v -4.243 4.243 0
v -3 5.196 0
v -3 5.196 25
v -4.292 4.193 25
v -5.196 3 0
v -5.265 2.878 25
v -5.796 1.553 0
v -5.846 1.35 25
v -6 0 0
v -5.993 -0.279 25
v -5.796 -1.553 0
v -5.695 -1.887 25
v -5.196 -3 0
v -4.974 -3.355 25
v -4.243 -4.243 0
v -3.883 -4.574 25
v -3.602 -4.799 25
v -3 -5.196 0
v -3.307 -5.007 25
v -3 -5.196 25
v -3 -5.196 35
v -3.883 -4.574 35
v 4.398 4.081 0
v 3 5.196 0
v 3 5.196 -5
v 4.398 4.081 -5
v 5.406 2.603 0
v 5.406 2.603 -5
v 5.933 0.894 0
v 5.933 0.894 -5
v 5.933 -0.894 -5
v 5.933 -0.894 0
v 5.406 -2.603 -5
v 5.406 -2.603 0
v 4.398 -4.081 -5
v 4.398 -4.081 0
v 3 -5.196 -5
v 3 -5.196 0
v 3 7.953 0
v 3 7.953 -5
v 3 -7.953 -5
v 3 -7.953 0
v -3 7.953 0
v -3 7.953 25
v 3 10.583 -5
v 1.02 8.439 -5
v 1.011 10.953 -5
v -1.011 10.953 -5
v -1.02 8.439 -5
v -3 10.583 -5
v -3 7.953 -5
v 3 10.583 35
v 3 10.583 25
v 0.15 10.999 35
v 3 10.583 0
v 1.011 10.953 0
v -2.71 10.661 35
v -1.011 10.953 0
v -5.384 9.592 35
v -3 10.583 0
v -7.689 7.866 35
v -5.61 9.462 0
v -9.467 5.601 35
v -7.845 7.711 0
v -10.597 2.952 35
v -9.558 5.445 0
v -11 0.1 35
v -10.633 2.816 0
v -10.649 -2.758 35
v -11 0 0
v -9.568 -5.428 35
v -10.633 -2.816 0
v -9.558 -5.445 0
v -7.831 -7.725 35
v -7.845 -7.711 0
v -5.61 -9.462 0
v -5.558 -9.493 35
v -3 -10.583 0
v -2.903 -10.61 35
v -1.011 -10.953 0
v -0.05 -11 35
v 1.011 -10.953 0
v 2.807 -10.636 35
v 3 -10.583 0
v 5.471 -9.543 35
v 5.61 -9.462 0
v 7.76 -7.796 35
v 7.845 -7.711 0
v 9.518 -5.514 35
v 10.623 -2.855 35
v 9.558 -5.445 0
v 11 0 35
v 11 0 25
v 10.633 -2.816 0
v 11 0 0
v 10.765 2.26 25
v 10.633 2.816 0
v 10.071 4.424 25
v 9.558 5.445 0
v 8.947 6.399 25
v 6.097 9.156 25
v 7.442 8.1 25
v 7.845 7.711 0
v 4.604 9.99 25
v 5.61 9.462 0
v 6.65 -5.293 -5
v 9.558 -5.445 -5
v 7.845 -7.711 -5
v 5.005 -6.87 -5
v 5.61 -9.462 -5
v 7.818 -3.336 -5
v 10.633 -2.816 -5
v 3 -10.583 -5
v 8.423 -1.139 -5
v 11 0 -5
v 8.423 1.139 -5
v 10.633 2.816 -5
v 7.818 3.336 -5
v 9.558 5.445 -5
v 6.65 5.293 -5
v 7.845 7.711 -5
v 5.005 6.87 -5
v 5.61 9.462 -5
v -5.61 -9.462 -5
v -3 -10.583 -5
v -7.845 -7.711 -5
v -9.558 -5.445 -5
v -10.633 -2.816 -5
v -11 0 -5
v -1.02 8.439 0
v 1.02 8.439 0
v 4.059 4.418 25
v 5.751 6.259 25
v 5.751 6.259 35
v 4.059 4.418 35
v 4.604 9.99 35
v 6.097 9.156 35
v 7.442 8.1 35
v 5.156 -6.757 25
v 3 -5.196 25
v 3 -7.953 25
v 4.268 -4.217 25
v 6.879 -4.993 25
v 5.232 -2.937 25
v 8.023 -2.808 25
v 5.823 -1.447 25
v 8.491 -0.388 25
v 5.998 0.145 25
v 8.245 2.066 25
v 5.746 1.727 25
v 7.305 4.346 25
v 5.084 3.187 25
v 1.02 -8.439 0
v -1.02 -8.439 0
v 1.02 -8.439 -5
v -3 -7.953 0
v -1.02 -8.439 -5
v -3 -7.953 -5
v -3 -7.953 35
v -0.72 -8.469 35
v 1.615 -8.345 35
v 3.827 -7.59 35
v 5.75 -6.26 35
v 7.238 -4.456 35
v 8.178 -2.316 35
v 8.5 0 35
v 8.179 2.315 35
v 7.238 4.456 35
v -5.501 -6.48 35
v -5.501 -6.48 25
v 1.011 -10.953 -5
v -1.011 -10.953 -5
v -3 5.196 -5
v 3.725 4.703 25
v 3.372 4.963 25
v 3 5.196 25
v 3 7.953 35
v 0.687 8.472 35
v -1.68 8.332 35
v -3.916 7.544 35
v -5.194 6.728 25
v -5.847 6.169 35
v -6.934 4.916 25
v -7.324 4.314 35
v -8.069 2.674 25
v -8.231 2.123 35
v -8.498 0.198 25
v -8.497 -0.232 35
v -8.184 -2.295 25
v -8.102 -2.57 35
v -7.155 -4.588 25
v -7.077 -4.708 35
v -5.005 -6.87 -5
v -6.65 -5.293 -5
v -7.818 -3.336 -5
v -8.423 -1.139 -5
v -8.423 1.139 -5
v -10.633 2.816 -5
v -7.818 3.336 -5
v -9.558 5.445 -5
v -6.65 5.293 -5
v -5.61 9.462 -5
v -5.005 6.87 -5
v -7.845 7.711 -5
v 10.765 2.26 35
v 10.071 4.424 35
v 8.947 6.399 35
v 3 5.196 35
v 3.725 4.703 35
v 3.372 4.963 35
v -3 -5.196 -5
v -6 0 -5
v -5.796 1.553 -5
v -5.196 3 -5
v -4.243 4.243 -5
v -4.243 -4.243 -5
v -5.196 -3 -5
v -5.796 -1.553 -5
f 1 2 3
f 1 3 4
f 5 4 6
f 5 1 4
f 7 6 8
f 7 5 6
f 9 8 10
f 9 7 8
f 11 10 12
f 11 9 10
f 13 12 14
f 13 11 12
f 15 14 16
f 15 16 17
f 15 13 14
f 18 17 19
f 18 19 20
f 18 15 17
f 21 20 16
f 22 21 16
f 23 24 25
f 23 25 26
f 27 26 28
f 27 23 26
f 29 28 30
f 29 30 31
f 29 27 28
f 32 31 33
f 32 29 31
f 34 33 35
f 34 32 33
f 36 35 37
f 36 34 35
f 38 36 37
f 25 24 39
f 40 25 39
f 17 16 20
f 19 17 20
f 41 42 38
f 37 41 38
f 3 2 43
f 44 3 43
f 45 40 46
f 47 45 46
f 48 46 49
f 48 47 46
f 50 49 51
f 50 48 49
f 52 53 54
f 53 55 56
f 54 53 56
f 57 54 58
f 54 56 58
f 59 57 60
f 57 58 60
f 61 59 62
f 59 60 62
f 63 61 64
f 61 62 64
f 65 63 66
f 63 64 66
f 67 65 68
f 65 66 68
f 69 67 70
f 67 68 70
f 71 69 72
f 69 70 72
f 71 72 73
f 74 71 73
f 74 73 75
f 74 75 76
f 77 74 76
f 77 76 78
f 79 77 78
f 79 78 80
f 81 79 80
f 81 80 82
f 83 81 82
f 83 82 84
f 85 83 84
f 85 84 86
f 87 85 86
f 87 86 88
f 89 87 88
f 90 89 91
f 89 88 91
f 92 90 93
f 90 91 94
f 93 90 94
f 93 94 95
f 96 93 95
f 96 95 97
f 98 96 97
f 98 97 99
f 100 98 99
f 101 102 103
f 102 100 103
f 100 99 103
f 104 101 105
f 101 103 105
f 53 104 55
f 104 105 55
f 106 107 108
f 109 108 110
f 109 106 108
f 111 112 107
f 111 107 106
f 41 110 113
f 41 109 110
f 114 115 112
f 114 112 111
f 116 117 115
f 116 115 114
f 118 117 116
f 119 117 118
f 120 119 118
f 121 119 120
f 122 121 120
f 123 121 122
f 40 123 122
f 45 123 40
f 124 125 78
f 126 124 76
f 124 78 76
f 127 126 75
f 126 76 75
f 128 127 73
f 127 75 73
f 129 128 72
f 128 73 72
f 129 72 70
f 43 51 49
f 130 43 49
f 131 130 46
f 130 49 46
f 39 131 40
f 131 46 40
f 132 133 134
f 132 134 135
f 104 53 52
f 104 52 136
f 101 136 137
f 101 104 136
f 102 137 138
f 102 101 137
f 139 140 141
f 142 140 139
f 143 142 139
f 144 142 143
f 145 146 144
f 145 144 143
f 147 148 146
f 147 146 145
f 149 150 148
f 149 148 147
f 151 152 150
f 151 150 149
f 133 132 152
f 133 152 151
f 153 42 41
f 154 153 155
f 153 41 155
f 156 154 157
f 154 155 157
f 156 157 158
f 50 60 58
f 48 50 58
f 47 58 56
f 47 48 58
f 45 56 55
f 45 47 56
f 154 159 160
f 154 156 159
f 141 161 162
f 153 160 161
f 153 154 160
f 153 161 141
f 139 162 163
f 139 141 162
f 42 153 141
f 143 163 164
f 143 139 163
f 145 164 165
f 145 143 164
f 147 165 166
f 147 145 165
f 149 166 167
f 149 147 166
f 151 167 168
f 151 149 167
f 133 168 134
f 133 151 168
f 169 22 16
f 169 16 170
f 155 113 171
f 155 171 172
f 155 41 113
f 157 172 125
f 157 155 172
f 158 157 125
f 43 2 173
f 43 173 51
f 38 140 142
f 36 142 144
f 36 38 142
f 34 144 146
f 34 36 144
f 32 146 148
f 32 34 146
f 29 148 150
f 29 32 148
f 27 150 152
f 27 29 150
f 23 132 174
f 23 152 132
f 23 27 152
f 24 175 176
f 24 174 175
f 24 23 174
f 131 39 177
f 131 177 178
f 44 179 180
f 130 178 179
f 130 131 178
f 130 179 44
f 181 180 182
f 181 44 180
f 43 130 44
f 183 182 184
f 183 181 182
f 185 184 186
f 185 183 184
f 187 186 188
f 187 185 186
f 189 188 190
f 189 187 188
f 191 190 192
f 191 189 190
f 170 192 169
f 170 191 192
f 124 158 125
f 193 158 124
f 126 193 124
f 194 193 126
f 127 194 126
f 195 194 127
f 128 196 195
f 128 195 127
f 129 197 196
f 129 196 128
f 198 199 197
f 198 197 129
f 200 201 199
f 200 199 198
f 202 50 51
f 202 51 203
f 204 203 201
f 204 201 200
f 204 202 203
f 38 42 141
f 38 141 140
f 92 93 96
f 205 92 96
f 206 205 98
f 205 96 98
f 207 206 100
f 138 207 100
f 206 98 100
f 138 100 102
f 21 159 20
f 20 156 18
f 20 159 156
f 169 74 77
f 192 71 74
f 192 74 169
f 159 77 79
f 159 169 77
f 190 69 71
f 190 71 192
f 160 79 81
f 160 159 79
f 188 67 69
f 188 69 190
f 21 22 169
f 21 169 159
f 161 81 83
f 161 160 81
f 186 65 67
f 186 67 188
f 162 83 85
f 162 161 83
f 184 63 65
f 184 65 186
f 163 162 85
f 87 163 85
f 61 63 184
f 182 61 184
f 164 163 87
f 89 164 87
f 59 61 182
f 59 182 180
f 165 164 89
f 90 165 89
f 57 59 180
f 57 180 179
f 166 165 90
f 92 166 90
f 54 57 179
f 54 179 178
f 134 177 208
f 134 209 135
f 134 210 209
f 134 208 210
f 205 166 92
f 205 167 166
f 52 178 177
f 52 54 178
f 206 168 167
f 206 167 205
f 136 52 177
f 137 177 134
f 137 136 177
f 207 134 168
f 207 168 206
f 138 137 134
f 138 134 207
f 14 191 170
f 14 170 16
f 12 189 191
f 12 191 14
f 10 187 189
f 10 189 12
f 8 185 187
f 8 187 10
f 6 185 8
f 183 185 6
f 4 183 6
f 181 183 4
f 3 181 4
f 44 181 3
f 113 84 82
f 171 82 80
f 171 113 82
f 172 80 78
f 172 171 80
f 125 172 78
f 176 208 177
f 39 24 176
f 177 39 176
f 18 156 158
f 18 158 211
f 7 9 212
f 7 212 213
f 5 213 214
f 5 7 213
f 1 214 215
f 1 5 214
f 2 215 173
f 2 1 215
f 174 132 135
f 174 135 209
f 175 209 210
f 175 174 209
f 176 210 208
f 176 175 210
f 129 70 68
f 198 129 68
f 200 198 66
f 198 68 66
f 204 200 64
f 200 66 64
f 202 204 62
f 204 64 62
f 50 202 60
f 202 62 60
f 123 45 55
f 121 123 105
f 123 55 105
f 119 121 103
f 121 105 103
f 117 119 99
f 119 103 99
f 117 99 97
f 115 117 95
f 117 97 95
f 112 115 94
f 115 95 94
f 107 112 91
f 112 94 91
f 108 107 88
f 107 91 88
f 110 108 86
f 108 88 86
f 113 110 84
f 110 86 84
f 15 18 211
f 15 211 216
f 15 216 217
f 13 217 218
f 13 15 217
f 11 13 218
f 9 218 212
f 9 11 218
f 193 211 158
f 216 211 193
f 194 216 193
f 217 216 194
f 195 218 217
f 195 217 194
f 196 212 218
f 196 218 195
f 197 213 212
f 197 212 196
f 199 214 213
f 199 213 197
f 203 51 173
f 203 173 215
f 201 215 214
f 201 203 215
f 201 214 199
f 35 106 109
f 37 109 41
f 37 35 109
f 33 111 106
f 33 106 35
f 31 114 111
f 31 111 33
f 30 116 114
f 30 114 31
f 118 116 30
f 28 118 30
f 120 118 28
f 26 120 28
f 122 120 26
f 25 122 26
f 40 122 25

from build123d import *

# Parameters (mm, degrees)
CROQUIS1_R              = 11
CROQUIS1_R_2            = 6
SALIENTE_EXTRUIR1_DEPTH = 25
CROQUIS2_W              = 6
CROQUIS2_H              = 22
CORTAR_EXTRUIR1_DEPTH   = 25
CROQUIS3_R              = 11
CROQUIS3_R_2            = 8.5
SALIENTE_EXTRUIR2_DEPTH = 25
SALIENTE_EXTRUIR3_DEPTH = 10
SALIENTE_EXTRUIR4_DEPTH = 10
CROQUIS9_R              = 11
CROQUIS9_R_2            = 8.5
SALIENTE_EXTRUIR5_DEPTH = 10
CROQUIS13_R             = 11
CROQUIS13_R_2           = 6
SALIENTE_EXTRUIR6_DEPTH = 5
CROQUIS14_W             = 6
CROQUIS14_H             = 22
CORTAR_EXTRUIR2_DEPTH   = 5
CROQUIS15_R             = 11
CROQUIS15_R_2           = 8.5
SALIENTE_EXTRUIR7_DEPTH = 5


with BuildPart() as part:
    # Croquis1 → Saliente-Extruir1 (new body)
    with BuildSketch(Plane.XY):
        Circle(CROQUIS1_R)
        Circle(CROQUIS1_R_2, mode=Mode.SUBTRACT)
    extrude(amount=SALIENTE_EXTRUIR1_DEPTH)

    # Croquis2 → Cortar-Extruir1 (cut)
    with BuildSketch(Plane.XY.offset(25)):
        Rectangle(CROQUIS2_W, CROQUIS2_H)
    extrude(amount=-CORTAR_EXTRUIR1_DEPTH, mode=Mode.SUBTRACT)

    # Croquis3 → Saliente-Extruir2 (add)
    with BuildSketch(Plane.XY):
        Circle(CROQUIS3_R)
        Circle(CROQUIS3_R_2, mode=Mode.SUBTRACT)
    extrude(amount=SALIENTE_EXTRUIR2_DEPTH)

    # Croquis4 → Saliente-Extruir3 (add)
    with BuildSketch(Plane.XY.offset(25)):
        with BuildLine():
            Line((3, 5.196152423), (3, 10.583005244))
            ThreePointArc((3, 10.583005244), (5.366490611, 9.602123647), (7.441930866, 8.100473133))
            Line((7.441930866, 8.100473133), (4.059235018, 4.418439891))
            ThreePointArc((4.059235018, 4.418439891), (3.550972959, 4.83638202), (3, 5.196152423))
        make_face()
    extrude(amount=SALIENTE_EXTRUIR3_DEPTH)

    # Croquis8 → Saliente-Extruir4 (add)
    with BuildSketch(Plane.XY.offset(25)):
        Polygon((-3, -10.583005244), (-3, -5.196152423), (-3.883308042, -4.573829758), (-7.119398076, -8.385354556), align=None)
    extrude(amount=SALIENTE_EXTRUIR4_DEPTH)

    # Croquis9 → Saliente-Extruir5 (add)
    with BuildSketch(Plane.XY.offset(25)):
        Circle(CROQUIS9_R)
        Circle(CROQUIS9_R_2, mode=Mode.SUBTRACT)
    extrude(amount=SALIENTE_EXTRUIR5_DEPTH)

    # Croquis13 → Saliente-Extruir6 (add)
    with BuildSketch(Plane(origin=(0, 0, 0), x_dir=(-1, 0, 0), z_dir=(0, 0, -1))):
        Circle(CROQUIS13_R)
        Circle(CROQUIS13_R_2, mode=Mode.SUBTRACT)
    extrude(amount=SALIENTE_EXTRUIR6_DEPTH)

    # Croquis14 → Cortar-Extruir2 (cut)
    with BuildSketch(Plane(origin=(0, 0, -5), x_dir=(-1, 0, 0), z_dir=(0, 0, -1))):
        Rectangle(CROQUIS14_W, CROQUIS14_H)
    extrude(amount=-CORTAR_EXTRUIR2_DEPTH, mode=Mode.SUBTRACT)

    # Croquis15 → Saliente-Extruir7 (add)
    with BuildSketch(Plane(origin=(0, 0, -5), x_dir=(-1, 0, 0), z_dir=(0, 0, -1))):
        Circle(CROQUIS15_R)
        Circle(CROQUIS15_R_2, mode=Mode.SUBTRACT)
    extrude(amount=-SALIENTE_EXTRUIR7_DEPTH)


solid = part.part
